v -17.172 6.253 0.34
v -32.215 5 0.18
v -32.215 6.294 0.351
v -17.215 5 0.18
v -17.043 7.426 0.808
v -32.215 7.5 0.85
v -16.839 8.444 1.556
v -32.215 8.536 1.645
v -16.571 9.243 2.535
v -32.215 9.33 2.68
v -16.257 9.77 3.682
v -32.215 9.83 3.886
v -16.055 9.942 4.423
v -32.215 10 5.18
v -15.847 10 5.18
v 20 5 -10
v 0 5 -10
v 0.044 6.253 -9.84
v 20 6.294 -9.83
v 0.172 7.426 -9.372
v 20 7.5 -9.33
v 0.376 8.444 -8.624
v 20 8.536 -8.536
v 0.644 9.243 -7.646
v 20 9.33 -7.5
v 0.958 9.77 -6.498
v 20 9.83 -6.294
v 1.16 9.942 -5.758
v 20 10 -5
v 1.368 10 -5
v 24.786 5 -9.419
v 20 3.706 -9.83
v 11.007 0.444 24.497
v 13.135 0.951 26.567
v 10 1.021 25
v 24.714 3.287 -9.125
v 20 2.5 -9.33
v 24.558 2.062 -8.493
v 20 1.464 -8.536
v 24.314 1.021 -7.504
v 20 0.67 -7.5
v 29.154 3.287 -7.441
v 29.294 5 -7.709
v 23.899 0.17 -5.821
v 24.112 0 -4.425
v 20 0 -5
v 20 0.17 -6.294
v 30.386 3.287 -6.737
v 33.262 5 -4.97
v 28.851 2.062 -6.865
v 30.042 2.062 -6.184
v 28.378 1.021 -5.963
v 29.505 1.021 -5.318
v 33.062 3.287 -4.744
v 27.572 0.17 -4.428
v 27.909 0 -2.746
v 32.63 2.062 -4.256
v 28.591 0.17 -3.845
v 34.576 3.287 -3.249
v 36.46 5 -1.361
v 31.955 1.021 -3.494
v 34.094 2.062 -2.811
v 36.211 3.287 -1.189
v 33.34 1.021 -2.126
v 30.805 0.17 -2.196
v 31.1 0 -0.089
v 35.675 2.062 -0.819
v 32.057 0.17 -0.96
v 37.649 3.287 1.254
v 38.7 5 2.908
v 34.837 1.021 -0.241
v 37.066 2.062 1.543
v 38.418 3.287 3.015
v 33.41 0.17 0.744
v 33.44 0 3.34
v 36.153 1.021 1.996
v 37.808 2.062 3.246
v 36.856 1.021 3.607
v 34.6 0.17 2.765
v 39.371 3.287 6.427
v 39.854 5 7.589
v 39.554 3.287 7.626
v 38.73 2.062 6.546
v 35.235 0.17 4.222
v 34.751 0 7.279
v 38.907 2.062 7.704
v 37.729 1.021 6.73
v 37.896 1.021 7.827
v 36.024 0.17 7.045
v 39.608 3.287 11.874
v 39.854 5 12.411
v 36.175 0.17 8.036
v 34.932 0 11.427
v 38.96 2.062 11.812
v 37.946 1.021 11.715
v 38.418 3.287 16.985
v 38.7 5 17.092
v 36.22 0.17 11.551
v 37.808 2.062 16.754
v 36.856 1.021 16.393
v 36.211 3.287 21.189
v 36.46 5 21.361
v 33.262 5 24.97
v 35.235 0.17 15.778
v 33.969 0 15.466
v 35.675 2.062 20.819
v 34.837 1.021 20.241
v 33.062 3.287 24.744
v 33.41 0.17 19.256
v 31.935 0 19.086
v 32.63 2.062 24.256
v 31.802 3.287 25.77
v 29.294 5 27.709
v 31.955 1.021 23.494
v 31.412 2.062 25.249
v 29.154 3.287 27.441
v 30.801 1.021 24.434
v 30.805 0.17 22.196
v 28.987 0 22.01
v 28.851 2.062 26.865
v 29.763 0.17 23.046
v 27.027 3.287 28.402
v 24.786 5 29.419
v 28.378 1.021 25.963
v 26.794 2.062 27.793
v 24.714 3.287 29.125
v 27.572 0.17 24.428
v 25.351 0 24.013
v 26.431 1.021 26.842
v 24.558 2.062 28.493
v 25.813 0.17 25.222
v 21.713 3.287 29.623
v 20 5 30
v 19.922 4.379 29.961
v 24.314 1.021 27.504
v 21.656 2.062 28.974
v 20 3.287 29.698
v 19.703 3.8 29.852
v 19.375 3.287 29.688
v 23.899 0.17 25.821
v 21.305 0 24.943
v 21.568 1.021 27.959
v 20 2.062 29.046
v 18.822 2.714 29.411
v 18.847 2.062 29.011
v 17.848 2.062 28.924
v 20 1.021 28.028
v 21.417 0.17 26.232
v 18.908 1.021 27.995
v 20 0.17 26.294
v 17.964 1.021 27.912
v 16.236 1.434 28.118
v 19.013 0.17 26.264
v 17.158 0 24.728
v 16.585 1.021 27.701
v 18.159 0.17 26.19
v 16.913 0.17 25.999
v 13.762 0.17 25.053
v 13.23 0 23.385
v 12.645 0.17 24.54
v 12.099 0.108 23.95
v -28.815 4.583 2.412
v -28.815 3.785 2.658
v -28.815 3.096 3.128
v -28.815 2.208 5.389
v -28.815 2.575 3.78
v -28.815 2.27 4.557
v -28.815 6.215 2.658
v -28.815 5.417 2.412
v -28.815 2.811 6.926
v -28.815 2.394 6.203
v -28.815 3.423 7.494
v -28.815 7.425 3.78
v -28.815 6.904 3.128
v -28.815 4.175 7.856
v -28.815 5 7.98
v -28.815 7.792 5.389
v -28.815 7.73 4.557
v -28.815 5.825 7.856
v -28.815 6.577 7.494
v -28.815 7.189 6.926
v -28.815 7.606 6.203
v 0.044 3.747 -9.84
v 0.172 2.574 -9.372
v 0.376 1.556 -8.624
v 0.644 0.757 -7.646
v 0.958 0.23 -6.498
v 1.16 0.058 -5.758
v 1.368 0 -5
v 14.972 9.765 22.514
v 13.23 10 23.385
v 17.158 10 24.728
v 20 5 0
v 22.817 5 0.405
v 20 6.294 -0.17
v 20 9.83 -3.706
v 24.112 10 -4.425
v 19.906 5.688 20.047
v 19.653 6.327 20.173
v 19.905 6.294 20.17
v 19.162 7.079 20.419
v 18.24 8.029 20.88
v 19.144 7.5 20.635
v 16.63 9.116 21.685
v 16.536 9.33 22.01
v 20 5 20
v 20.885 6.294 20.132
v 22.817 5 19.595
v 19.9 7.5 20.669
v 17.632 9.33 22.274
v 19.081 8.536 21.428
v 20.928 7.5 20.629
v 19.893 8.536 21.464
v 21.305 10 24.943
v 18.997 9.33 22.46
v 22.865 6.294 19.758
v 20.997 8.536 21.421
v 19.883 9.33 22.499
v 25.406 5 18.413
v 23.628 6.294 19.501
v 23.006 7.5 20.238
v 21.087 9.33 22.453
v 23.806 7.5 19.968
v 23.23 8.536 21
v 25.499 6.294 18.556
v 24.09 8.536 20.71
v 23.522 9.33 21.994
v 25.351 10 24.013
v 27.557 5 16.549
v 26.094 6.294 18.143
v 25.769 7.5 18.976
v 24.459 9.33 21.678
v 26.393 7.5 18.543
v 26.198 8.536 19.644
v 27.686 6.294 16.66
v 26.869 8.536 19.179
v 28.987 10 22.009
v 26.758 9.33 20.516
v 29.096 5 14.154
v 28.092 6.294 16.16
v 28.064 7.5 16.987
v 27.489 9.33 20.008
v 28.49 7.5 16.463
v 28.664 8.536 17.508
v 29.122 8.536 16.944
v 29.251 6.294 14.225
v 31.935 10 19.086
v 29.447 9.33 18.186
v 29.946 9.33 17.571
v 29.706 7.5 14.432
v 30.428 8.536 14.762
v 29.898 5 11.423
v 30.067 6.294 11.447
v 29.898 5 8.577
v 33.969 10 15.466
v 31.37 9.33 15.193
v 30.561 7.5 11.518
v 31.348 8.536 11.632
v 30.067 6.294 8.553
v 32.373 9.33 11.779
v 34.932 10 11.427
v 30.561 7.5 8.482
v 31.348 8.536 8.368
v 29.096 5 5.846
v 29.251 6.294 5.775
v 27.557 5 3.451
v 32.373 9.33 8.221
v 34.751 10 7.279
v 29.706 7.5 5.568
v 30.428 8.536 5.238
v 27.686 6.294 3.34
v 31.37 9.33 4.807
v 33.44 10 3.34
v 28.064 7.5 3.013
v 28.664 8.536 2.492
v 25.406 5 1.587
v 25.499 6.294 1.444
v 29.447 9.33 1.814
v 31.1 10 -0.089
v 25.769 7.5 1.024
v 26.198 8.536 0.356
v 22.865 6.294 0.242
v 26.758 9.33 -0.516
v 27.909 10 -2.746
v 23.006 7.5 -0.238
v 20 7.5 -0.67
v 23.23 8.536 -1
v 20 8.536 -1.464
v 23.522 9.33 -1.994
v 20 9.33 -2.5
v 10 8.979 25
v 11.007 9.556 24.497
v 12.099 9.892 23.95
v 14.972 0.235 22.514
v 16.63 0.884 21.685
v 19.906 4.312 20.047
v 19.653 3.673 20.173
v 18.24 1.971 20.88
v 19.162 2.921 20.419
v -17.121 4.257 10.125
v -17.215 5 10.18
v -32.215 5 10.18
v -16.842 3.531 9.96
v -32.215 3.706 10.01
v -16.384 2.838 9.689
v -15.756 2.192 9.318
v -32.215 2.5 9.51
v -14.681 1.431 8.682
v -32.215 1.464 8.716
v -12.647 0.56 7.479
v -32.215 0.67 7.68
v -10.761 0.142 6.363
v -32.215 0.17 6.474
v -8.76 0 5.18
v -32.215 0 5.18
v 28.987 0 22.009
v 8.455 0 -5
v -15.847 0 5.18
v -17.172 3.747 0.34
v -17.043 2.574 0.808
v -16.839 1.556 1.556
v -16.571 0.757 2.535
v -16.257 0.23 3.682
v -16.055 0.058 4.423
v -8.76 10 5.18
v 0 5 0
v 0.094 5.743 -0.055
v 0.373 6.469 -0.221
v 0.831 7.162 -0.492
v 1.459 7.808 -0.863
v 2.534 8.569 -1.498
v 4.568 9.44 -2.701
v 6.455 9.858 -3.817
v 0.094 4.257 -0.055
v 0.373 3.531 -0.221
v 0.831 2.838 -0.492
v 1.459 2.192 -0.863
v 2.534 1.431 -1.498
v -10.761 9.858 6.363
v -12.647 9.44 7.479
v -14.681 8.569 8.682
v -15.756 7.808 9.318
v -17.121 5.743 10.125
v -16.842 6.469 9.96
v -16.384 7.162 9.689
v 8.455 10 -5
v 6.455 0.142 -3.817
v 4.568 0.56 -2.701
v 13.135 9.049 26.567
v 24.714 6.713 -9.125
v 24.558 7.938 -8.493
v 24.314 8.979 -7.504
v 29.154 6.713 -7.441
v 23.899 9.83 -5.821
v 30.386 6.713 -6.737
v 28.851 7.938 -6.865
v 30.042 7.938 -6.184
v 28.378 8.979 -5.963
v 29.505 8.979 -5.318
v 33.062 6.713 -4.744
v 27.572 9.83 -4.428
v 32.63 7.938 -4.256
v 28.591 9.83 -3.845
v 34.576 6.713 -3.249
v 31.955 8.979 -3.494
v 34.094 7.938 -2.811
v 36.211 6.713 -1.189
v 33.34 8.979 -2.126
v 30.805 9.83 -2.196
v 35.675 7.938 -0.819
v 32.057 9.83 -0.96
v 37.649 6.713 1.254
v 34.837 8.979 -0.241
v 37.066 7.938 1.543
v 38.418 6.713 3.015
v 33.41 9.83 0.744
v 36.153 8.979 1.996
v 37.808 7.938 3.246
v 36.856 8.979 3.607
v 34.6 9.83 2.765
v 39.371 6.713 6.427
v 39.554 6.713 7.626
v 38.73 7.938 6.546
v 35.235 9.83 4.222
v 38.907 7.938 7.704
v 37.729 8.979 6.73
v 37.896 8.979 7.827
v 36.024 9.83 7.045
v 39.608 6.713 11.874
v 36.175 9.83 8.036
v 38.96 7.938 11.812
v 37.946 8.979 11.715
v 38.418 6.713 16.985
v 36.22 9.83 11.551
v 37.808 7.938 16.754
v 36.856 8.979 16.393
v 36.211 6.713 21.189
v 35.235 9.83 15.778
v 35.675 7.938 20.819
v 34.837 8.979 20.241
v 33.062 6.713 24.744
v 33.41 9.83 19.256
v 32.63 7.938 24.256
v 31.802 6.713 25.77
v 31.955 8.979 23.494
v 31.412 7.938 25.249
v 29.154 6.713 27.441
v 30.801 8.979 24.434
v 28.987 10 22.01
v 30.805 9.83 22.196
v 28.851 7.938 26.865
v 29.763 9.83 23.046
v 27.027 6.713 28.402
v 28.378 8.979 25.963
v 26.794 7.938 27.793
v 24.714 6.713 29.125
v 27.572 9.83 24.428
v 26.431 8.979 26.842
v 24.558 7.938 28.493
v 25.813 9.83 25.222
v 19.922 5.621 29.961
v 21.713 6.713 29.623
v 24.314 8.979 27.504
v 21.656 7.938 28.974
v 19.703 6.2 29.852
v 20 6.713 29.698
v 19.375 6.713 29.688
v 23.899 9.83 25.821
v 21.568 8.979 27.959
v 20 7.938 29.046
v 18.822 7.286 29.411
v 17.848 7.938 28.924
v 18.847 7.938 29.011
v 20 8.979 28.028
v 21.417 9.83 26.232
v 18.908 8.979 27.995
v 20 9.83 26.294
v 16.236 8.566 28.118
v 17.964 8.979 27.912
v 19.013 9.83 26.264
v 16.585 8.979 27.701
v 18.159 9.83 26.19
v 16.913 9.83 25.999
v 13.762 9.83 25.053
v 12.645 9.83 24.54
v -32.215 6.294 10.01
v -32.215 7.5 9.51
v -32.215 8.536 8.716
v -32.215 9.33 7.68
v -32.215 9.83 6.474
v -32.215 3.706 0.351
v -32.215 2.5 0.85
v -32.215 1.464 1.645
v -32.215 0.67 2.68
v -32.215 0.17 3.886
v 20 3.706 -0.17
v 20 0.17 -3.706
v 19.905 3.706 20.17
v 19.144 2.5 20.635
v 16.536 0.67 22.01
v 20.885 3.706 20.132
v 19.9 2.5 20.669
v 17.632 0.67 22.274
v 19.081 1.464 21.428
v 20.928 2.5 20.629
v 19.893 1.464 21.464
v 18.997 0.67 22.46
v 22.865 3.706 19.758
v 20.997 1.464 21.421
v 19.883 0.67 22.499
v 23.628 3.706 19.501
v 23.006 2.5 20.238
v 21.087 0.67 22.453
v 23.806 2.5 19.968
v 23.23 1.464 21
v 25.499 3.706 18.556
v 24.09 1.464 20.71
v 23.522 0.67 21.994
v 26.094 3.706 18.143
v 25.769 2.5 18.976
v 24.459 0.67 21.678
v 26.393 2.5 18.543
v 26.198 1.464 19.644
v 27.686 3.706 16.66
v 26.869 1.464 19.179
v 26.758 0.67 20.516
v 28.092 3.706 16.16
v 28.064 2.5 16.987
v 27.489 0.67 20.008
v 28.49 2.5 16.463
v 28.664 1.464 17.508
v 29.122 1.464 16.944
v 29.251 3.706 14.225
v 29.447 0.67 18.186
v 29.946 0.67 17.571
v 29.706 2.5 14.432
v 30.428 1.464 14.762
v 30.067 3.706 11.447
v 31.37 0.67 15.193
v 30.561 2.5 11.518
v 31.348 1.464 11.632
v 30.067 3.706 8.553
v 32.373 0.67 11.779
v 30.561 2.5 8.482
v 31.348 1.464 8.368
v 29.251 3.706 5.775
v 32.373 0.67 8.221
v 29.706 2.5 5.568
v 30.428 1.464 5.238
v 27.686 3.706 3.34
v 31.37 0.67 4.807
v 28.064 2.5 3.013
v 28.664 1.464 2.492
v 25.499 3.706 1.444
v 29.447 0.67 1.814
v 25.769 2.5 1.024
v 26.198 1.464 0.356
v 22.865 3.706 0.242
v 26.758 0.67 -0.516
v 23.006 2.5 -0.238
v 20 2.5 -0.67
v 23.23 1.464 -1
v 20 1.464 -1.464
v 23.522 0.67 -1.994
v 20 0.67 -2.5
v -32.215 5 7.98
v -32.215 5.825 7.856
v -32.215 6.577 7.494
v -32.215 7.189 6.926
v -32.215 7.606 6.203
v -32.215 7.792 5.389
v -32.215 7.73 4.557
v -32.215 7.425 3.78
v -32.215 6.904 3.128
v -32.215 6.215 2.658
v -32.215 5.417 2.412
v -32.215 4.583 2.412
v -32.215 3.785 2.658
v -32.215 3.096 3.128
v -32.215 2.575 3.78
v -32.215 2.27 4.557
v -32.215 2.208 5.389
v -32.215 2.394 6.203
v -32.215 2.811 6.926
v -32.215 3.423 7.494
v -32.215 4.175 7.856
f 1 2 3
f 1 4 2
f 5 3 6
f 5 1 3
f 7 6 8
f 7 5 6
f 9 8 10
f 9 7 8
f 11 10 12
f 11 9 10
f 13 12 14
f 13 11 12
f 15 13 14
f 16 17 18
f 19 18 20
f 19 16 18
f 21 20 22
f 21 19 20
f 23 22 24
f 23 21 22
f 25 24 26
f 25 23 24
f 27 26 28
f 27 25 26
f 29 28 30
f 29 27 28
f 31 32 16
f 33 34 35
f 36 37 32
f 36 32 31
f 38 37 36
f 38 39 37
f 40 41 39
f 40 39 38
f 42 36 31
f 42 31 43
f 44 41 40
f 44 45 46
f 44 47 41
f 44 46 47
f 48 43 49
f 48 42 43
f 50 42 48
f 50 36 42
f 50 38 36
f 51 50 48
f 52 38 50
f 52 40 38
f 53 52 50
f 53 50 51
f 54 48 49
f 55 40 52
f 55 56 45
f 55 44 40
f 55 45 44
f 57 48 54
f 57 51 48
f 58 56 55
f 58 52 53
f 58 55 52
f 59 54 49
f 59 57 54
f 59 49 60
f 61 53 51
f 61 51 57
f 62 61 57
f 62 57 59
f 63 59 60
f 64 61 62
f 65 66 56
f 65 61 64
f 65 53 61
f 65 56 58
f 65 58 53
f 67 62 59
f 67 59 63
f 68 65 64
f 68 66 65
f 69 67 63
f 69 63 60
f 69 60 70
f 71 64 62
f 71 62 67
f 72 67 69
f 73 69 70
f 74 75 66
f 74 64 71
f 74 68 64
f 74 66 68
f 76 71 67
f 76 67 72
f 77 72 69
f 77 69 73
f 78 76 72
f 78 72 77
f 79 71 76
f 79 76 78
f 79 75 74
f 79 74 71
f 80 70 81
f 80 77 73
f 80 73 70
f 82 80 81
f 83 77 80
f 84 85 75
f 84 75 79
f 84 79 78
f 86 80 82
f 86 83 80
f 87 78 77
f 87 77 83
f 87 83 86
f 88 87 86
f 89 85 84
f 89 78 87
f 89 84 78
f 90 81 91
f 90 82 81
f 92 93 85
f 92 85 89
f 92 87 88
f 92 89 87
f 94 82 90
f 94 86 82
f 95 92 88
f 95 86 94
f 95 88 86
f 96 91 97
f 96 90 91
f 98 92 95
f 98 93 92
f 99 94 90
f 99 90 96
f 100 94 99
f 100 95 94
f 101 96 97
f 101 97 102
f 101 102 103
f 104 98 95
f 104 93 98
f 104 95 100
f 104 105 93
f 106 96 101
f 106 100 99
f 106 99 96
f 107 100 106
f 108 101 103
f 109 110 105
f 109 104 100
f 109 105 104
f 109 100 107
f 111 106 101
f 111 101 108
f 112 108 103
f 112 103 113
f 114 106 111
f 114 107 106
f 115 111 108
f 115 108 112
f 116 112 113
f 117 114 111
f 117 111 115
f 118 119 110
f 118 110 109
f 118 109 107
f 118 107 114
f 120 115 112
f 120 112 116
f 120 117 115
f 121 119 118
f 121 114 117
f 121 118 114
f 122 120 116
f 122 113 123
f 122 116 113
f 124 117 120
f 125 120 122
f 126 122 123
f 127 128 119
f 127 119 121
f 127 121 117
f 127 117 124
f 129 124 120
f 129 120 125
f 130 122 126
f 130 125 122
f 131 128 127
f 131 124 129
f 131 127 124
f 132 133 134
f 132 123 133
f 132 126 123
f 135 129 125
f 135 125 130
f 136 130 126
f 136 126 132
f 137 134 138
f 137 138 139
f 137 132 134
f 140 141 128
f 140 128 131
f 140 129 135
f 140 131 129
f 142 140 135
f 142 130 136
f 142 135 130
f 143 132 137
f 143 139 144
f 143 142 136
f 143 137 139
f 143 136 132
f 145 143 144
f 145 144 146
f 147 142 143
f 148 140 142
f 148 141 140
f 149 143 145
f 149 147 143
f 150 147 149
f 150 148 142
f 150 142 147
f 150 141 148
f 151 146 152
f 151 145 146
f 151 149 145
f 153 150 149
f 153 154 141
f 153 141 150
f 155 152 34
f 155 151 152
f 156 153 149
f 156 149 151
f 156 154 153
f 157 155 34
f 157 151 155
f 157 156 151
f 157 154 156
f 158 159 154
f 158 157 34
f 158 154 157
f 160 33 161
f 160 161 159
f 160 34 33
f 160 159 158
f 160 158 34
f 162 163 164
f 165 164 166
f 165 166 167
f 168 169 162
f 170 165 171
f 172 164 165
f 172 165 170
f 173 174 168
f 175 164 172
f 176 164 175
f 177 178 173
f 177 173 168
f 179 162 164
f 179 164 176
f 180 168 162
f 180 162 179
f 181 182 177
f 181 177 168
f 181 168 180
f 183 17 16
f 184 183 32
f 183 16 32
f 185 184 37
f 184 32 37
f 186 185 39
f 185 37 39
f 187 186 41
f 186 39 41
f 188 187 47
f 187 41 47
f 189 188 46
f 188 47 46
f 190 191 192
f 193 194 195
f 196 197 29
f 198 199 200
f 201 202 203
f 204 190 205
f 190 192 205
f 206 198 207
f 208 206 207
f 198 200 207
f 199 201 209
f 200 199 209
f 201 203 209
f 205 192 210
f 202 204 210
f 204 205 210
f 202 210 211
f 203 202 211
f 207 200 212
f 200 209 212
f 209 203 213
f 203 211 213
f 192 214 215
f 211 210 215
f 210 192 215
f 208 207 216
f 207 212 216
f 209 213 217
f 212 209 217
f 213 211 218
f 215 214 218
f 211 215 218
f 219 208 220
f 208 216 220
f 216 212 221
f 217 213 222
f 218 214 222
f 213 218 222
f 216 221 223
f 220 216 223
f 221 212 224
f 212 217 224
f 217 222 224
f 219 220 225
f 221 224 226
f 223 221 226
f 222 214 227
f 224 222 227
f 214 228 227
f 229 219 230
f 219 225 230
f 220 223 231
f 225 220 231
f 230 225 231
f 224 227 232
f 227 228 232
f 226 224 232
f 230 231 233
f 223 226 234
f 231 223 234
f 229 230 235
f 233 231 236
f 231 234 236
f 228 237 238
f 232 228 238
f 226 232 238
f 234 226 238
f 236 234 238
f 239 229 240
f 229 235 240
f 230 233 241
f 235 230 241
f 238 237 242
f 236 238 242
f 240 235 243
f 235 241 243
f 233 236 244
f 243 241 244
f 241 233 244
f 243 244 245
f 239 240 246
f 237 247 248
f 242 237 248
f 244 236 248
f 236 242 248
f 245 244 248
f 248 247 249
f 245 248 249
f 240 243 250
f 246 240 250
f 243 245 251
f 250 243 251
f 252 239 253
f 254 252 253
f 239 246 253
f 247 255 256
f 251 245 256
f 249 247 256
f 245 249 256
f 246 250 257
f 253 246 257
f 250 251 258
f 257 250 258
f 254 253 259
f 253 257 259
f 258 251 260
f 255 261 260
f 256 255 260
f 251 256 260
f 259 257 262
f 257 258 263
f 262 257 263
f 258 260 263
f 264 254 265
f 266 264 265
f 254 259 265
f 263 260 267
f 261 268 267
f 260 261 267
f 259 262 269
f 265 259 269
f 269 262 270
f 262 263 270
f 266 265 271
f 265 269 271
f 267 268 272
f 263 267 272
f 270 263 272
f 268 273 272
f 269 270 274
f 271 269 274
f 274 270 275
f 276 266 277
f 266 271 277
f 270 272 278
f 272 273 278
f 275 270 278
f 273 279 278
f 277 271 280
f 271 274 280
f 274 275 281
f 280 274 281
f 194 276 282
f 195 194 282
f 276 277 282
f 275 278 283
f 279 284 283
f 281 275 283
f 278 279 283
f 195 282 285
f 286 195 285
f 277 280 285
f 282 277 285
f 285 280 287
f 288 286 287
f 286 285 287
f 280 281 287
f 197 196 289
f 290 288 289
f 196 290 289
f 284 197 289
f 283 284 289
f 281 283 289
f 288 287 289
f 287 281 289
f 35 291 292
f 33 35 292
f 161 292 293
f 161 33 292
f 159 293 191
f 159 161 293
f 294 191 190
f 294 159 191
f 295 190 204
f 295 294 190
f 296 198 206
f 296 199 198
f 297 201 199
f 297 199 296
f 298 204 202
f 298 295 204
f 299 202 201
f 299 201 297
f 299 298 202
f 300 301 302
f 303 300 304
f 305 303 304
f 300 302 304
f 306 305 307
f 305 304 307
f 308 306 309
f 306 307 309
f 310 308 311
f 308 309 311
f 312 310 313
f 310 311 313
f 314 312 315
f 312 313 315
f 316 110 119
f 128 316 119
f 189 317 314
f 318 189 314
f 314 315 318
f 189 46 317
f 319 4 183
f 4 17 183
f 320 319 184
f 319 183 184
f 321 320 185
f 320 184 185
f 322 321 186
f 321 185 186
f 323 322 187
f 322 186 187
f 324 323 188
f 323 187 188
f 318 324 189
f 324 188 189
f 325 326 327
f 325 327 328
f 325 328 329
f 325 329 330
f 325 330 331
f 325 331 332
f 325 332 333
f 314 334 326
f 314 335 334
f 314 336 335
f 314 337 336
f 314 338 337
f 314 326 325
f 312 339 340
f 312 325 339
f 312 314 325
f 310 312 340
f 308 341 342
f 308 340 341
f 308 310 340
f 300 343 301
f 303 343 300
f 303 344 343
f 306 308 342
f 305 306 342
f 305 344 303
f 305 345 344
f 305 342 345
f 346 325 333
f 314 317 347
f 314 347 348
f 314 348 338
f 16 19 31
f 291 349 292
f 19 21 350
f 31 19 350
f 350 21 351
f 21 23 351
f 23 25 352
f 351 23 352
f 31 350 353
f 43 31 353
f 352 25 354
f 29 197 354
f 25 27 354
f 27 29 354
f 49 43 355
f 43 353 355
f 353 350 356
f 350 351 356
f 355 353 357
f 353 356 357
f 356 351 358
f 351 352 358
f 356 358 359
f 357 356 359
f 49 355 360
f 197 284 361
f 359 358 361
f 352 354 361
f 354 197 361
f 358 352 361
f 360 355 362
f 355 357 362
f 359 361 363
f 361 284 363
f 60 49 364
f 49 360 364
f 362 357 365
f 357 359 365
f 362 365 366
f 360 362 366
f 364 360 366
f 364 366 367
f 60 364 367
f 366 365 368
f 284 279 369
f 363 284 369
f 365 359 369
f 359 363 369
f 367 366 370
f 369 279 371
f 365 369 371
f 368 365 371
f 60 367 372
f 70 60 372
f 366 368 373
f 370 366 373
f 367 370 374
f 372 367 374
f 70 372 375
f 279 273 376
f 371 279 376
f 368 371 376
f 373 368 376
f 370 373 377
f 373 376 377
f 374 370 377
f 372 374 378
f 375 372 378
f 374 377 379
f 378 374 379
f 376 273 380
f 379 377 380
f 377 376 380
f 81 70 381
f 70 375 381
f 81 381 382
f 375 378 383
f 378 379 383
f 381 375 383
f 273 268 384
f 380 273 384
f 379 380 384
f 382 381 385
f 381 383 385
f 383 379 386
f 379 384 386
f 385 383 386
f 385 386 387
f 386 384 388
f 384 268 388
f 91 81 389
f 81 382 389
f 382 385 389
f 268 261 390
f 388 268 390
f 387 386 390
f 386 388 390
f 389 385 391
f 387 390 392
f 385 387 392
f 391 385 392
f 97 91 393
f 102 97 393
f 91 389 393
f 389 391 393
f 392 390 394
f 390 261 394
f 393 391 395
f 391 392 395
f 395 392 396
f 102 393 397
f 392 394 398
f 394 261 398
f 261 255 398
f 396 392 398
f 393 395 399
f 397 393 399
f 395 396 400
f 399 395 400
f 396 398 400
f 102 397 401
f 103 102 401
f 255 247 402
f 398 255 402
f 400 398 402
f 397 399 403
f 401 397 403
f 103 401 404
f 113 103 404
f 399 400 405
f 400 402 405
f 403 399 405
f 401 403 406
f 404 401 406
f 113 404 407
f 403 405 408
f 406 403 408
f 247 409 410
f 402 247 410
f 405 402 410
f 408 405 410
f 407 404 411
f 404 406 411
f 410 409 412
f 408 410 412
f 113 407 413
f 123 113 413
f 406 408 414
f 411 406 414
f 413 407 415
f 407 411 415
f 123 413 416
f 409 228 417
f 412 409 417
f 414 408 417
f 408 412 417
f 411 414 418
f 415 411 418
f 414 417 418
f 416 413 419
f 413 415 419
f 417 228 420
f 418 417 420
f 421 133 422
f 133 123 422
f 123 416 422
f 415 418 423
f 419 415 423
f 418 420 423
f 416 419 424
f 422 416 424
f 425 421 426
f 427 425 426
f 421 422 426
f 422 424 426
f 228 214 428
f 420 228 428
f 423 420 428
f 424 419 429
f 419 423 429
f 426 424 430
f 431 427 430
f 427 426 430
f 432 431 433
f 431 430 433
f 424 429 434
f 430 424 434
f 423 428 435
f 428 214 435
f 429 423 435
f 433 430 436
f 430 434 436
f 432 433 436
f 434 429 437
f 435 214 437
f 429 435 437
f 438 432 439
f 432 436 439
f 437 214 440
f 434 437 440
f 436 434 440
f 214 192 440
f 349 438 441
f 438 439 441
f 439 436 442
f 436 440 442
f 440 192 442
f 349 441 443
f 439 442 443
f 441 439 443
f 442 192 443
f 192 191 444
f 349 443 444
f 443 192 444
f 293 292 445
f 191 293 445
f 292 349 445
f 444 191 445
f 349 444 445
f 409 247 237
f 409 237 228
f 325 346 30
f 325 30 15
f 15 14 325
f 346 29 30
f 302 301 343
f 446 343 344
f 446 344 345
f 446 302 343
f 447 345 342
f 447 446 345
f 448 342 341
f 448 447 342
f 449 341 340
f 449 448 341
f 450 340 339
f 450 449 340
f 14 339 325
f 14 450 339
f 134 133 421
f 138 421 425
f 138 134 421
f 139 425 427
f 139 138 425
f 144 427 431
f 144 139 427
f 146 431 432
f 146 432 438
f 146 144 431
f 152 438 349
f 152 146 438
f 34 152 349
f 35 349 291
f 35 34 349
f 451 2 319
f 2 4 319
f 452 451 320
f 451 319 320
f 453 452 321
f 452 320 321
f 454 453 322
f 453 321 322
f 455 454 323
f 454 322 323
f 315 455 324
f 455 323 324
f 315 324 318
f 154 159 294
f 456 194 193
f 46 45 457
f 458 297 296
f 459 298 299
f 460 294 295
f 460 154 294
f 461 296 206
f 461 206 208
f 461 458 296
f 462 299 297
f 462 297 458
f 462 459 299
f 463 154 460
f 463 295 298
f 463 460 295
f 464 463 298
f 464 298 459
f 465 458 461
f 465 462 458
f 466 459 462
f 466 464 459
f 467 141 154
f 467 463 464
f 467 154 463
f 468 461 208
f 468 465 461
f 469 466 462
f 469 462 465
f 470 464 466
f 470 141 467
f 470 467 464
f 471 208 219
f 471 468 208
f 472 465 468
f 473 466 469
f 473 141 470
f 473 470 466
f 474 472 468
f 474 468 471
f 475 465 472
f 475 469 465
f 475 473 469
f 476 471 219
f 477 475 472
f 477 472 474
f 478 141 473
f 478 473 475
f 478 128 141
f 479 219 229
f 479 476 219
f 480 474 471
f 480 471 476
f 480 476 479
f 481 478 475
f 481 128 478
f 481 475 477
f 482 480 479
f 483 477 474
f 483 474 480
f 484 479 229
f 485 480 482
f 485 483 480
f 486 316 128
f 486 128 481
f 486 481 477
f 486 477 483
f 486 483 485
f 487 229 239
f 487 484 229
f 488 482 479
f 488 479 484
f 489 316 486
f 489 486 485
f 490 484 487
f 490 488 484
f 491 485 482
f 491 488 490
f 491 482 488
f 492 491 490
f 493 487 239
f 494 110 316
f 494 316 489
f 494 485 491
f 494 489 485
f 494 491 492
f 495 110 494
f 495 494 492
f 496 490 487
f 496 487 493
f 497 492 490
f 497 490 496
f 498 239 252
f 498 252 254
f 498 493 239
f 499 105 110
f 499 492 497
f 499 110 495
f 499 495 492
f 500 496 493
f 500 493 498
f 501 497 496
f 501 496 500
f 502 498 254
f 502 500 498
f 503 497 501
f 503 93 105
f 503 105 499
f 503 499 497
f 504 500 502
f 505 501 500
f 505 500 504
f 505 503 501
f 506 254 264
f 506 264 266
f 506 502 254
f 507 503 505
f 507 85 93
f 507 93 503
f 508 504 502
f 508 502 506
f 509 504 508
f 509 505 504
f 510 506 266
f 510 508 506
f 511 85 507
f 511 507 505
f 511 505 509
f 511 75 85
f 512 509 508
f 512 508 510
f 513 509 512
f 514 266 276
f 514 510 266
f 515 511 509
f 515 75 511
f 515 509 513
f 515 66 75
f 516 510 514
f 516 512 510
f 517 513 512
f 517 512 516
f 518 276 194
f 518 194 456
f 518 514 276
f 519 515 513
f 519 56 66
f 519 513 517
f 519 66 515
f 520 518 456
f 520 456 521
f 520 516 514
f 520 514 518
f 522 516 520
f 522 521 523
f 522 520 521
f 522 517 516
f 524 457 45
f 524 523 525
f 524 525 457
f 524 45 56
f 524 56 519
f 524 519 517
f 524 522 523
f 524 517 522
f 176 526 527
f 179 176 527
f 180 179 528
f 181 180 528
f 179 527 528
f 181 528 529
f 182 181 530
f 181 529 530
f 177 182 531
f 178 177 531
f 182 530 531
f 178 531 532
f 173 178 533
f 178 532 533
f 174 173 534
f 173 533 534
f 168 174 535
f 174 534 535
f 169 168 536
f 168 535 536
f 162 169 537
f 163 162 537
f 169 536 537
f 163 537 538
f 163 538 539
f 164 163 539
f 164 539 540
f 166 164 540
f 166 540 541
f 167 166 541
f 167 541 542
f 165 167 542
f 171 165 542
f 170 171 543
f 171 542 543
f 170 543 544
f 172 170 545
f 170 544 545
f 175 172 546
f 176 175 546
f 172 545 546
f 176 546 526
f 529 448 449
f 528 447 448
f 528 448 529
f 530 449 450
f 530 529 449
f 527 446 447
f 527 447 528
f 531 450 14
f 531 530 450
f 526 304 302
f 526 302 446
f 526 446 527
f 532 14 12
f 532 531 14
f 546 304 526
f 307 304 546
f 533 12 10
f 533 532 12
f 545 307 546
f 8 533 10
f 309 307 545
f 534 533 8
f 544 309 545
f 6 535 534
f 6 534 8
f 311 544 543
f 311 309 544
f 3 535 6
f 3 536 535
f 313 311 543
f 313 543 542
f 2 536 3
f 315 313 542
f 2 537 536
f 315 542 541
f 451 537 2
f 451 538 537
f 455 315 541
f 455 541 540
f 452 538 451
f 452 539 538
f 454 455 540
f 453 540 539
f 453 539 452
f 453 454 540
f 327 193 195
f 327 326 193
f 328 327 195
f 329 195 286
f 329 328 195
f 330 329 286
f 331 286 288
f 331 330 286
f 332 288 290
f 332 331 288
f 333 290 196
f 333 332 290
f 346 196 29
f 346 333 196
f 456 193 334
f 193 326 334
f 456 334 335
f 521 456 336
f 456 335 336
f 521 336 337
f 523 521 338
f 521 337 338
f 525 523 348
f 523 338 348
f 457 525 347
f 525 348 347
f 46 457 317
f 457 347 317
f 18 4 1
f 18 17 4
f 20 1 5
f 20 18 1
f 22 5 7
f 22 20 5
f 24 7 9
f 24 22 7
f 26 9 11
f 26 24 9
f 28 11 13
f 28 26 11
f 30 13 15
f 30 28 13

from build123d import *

# Parameters (mm, degrees)
EXTRUDE_1_DEPTH     = 10
FILLET_5_R          = 5
FILLET_6_R          = 5
SKETCH_22_R         = 2.8
CUT_EXTRUDE_1_DEPTH = 3.4


with BuildPart() as part:
    # Эскиз2 → Бобышка-Вытянуть1 (new body)
    with BuildSketch(Plane(origin=(0, 0, 0), x_dir=(1, 0, 0), z_dir=(0, 1, 0))):
        with BuildLine():
            Line((10, -25), (20, -20))
            ThreePointArc((20, -20), (30, -10), (20, 0))
            Line((20, 0), (0, 0))
            Line((0, 0), (-17.215189328, -10.180238524))
            Line((-17.215189328, -10.180238524), (-32.215189328, -10.180238524))
            Line((-32.215189328, -10.180238524), (-32.215189328, -0.180238524))
            Line((-32.215189328, -0.180238524), (-17.215189328, -0.180238524))
            Line((-17.215189328, -0.180238524), (0, 10))
            Line((0, 10), (20, 10))
            ThreePointArc((20, 10), (40, -10), (20, -30))
            Line((20, -30), (10, -25))
        make_face()
    extrude(amount=EXTRUDE_1_DEPTH)

    # Скругление5
    fillet_5_edges = [part.edges().sort_by_distance(p)[0] for p in [
        (30, 10, 10),
        (30, 0, 10),
        (10, 10, 0),
        (10, 0, 0),
        (-24.715189328, 10, 10.180238524),
        (-24.715189328, 0, 10.180238524),
    ]]
    fillet(fillet_5_edges, radius=FILLET_5_R - 0.0001)  # a hair under: the kernel refuses the full size

    # Скругление6
    fillet_6_edges = [part.edges().sort_by_distance(p)[0] for p in [
        (40, 10, 10),
        (40, 0, 10),
        (10, 10, -10),
        (10, 0, -10),
        (-8.607594664, 10, -4.909880738),
        (-8.607594664, 0, -4.909880738),
        (-24.715189328, 10, 0.180238524),
        (-24.715189328, 0, 0.180238524),
    ]]
    fillet(fillet_6_edges, radius=FILLET_6_R - 0.0001)  # a hair under: the kernel refuses the full size

    # Эскиз22 → Вырез-Вытянуть1 (cut)
    with BuildSketch(Plane.ZY.offset(32.215189328)):
        with Locations((5.180238524, 5)):
            Circle(SKETCH_22_R)
    extrude(amount=-CUT_EXTRUDE_1_DEPTH, mode=Mode.SUBTRACT)


solid = part.part
